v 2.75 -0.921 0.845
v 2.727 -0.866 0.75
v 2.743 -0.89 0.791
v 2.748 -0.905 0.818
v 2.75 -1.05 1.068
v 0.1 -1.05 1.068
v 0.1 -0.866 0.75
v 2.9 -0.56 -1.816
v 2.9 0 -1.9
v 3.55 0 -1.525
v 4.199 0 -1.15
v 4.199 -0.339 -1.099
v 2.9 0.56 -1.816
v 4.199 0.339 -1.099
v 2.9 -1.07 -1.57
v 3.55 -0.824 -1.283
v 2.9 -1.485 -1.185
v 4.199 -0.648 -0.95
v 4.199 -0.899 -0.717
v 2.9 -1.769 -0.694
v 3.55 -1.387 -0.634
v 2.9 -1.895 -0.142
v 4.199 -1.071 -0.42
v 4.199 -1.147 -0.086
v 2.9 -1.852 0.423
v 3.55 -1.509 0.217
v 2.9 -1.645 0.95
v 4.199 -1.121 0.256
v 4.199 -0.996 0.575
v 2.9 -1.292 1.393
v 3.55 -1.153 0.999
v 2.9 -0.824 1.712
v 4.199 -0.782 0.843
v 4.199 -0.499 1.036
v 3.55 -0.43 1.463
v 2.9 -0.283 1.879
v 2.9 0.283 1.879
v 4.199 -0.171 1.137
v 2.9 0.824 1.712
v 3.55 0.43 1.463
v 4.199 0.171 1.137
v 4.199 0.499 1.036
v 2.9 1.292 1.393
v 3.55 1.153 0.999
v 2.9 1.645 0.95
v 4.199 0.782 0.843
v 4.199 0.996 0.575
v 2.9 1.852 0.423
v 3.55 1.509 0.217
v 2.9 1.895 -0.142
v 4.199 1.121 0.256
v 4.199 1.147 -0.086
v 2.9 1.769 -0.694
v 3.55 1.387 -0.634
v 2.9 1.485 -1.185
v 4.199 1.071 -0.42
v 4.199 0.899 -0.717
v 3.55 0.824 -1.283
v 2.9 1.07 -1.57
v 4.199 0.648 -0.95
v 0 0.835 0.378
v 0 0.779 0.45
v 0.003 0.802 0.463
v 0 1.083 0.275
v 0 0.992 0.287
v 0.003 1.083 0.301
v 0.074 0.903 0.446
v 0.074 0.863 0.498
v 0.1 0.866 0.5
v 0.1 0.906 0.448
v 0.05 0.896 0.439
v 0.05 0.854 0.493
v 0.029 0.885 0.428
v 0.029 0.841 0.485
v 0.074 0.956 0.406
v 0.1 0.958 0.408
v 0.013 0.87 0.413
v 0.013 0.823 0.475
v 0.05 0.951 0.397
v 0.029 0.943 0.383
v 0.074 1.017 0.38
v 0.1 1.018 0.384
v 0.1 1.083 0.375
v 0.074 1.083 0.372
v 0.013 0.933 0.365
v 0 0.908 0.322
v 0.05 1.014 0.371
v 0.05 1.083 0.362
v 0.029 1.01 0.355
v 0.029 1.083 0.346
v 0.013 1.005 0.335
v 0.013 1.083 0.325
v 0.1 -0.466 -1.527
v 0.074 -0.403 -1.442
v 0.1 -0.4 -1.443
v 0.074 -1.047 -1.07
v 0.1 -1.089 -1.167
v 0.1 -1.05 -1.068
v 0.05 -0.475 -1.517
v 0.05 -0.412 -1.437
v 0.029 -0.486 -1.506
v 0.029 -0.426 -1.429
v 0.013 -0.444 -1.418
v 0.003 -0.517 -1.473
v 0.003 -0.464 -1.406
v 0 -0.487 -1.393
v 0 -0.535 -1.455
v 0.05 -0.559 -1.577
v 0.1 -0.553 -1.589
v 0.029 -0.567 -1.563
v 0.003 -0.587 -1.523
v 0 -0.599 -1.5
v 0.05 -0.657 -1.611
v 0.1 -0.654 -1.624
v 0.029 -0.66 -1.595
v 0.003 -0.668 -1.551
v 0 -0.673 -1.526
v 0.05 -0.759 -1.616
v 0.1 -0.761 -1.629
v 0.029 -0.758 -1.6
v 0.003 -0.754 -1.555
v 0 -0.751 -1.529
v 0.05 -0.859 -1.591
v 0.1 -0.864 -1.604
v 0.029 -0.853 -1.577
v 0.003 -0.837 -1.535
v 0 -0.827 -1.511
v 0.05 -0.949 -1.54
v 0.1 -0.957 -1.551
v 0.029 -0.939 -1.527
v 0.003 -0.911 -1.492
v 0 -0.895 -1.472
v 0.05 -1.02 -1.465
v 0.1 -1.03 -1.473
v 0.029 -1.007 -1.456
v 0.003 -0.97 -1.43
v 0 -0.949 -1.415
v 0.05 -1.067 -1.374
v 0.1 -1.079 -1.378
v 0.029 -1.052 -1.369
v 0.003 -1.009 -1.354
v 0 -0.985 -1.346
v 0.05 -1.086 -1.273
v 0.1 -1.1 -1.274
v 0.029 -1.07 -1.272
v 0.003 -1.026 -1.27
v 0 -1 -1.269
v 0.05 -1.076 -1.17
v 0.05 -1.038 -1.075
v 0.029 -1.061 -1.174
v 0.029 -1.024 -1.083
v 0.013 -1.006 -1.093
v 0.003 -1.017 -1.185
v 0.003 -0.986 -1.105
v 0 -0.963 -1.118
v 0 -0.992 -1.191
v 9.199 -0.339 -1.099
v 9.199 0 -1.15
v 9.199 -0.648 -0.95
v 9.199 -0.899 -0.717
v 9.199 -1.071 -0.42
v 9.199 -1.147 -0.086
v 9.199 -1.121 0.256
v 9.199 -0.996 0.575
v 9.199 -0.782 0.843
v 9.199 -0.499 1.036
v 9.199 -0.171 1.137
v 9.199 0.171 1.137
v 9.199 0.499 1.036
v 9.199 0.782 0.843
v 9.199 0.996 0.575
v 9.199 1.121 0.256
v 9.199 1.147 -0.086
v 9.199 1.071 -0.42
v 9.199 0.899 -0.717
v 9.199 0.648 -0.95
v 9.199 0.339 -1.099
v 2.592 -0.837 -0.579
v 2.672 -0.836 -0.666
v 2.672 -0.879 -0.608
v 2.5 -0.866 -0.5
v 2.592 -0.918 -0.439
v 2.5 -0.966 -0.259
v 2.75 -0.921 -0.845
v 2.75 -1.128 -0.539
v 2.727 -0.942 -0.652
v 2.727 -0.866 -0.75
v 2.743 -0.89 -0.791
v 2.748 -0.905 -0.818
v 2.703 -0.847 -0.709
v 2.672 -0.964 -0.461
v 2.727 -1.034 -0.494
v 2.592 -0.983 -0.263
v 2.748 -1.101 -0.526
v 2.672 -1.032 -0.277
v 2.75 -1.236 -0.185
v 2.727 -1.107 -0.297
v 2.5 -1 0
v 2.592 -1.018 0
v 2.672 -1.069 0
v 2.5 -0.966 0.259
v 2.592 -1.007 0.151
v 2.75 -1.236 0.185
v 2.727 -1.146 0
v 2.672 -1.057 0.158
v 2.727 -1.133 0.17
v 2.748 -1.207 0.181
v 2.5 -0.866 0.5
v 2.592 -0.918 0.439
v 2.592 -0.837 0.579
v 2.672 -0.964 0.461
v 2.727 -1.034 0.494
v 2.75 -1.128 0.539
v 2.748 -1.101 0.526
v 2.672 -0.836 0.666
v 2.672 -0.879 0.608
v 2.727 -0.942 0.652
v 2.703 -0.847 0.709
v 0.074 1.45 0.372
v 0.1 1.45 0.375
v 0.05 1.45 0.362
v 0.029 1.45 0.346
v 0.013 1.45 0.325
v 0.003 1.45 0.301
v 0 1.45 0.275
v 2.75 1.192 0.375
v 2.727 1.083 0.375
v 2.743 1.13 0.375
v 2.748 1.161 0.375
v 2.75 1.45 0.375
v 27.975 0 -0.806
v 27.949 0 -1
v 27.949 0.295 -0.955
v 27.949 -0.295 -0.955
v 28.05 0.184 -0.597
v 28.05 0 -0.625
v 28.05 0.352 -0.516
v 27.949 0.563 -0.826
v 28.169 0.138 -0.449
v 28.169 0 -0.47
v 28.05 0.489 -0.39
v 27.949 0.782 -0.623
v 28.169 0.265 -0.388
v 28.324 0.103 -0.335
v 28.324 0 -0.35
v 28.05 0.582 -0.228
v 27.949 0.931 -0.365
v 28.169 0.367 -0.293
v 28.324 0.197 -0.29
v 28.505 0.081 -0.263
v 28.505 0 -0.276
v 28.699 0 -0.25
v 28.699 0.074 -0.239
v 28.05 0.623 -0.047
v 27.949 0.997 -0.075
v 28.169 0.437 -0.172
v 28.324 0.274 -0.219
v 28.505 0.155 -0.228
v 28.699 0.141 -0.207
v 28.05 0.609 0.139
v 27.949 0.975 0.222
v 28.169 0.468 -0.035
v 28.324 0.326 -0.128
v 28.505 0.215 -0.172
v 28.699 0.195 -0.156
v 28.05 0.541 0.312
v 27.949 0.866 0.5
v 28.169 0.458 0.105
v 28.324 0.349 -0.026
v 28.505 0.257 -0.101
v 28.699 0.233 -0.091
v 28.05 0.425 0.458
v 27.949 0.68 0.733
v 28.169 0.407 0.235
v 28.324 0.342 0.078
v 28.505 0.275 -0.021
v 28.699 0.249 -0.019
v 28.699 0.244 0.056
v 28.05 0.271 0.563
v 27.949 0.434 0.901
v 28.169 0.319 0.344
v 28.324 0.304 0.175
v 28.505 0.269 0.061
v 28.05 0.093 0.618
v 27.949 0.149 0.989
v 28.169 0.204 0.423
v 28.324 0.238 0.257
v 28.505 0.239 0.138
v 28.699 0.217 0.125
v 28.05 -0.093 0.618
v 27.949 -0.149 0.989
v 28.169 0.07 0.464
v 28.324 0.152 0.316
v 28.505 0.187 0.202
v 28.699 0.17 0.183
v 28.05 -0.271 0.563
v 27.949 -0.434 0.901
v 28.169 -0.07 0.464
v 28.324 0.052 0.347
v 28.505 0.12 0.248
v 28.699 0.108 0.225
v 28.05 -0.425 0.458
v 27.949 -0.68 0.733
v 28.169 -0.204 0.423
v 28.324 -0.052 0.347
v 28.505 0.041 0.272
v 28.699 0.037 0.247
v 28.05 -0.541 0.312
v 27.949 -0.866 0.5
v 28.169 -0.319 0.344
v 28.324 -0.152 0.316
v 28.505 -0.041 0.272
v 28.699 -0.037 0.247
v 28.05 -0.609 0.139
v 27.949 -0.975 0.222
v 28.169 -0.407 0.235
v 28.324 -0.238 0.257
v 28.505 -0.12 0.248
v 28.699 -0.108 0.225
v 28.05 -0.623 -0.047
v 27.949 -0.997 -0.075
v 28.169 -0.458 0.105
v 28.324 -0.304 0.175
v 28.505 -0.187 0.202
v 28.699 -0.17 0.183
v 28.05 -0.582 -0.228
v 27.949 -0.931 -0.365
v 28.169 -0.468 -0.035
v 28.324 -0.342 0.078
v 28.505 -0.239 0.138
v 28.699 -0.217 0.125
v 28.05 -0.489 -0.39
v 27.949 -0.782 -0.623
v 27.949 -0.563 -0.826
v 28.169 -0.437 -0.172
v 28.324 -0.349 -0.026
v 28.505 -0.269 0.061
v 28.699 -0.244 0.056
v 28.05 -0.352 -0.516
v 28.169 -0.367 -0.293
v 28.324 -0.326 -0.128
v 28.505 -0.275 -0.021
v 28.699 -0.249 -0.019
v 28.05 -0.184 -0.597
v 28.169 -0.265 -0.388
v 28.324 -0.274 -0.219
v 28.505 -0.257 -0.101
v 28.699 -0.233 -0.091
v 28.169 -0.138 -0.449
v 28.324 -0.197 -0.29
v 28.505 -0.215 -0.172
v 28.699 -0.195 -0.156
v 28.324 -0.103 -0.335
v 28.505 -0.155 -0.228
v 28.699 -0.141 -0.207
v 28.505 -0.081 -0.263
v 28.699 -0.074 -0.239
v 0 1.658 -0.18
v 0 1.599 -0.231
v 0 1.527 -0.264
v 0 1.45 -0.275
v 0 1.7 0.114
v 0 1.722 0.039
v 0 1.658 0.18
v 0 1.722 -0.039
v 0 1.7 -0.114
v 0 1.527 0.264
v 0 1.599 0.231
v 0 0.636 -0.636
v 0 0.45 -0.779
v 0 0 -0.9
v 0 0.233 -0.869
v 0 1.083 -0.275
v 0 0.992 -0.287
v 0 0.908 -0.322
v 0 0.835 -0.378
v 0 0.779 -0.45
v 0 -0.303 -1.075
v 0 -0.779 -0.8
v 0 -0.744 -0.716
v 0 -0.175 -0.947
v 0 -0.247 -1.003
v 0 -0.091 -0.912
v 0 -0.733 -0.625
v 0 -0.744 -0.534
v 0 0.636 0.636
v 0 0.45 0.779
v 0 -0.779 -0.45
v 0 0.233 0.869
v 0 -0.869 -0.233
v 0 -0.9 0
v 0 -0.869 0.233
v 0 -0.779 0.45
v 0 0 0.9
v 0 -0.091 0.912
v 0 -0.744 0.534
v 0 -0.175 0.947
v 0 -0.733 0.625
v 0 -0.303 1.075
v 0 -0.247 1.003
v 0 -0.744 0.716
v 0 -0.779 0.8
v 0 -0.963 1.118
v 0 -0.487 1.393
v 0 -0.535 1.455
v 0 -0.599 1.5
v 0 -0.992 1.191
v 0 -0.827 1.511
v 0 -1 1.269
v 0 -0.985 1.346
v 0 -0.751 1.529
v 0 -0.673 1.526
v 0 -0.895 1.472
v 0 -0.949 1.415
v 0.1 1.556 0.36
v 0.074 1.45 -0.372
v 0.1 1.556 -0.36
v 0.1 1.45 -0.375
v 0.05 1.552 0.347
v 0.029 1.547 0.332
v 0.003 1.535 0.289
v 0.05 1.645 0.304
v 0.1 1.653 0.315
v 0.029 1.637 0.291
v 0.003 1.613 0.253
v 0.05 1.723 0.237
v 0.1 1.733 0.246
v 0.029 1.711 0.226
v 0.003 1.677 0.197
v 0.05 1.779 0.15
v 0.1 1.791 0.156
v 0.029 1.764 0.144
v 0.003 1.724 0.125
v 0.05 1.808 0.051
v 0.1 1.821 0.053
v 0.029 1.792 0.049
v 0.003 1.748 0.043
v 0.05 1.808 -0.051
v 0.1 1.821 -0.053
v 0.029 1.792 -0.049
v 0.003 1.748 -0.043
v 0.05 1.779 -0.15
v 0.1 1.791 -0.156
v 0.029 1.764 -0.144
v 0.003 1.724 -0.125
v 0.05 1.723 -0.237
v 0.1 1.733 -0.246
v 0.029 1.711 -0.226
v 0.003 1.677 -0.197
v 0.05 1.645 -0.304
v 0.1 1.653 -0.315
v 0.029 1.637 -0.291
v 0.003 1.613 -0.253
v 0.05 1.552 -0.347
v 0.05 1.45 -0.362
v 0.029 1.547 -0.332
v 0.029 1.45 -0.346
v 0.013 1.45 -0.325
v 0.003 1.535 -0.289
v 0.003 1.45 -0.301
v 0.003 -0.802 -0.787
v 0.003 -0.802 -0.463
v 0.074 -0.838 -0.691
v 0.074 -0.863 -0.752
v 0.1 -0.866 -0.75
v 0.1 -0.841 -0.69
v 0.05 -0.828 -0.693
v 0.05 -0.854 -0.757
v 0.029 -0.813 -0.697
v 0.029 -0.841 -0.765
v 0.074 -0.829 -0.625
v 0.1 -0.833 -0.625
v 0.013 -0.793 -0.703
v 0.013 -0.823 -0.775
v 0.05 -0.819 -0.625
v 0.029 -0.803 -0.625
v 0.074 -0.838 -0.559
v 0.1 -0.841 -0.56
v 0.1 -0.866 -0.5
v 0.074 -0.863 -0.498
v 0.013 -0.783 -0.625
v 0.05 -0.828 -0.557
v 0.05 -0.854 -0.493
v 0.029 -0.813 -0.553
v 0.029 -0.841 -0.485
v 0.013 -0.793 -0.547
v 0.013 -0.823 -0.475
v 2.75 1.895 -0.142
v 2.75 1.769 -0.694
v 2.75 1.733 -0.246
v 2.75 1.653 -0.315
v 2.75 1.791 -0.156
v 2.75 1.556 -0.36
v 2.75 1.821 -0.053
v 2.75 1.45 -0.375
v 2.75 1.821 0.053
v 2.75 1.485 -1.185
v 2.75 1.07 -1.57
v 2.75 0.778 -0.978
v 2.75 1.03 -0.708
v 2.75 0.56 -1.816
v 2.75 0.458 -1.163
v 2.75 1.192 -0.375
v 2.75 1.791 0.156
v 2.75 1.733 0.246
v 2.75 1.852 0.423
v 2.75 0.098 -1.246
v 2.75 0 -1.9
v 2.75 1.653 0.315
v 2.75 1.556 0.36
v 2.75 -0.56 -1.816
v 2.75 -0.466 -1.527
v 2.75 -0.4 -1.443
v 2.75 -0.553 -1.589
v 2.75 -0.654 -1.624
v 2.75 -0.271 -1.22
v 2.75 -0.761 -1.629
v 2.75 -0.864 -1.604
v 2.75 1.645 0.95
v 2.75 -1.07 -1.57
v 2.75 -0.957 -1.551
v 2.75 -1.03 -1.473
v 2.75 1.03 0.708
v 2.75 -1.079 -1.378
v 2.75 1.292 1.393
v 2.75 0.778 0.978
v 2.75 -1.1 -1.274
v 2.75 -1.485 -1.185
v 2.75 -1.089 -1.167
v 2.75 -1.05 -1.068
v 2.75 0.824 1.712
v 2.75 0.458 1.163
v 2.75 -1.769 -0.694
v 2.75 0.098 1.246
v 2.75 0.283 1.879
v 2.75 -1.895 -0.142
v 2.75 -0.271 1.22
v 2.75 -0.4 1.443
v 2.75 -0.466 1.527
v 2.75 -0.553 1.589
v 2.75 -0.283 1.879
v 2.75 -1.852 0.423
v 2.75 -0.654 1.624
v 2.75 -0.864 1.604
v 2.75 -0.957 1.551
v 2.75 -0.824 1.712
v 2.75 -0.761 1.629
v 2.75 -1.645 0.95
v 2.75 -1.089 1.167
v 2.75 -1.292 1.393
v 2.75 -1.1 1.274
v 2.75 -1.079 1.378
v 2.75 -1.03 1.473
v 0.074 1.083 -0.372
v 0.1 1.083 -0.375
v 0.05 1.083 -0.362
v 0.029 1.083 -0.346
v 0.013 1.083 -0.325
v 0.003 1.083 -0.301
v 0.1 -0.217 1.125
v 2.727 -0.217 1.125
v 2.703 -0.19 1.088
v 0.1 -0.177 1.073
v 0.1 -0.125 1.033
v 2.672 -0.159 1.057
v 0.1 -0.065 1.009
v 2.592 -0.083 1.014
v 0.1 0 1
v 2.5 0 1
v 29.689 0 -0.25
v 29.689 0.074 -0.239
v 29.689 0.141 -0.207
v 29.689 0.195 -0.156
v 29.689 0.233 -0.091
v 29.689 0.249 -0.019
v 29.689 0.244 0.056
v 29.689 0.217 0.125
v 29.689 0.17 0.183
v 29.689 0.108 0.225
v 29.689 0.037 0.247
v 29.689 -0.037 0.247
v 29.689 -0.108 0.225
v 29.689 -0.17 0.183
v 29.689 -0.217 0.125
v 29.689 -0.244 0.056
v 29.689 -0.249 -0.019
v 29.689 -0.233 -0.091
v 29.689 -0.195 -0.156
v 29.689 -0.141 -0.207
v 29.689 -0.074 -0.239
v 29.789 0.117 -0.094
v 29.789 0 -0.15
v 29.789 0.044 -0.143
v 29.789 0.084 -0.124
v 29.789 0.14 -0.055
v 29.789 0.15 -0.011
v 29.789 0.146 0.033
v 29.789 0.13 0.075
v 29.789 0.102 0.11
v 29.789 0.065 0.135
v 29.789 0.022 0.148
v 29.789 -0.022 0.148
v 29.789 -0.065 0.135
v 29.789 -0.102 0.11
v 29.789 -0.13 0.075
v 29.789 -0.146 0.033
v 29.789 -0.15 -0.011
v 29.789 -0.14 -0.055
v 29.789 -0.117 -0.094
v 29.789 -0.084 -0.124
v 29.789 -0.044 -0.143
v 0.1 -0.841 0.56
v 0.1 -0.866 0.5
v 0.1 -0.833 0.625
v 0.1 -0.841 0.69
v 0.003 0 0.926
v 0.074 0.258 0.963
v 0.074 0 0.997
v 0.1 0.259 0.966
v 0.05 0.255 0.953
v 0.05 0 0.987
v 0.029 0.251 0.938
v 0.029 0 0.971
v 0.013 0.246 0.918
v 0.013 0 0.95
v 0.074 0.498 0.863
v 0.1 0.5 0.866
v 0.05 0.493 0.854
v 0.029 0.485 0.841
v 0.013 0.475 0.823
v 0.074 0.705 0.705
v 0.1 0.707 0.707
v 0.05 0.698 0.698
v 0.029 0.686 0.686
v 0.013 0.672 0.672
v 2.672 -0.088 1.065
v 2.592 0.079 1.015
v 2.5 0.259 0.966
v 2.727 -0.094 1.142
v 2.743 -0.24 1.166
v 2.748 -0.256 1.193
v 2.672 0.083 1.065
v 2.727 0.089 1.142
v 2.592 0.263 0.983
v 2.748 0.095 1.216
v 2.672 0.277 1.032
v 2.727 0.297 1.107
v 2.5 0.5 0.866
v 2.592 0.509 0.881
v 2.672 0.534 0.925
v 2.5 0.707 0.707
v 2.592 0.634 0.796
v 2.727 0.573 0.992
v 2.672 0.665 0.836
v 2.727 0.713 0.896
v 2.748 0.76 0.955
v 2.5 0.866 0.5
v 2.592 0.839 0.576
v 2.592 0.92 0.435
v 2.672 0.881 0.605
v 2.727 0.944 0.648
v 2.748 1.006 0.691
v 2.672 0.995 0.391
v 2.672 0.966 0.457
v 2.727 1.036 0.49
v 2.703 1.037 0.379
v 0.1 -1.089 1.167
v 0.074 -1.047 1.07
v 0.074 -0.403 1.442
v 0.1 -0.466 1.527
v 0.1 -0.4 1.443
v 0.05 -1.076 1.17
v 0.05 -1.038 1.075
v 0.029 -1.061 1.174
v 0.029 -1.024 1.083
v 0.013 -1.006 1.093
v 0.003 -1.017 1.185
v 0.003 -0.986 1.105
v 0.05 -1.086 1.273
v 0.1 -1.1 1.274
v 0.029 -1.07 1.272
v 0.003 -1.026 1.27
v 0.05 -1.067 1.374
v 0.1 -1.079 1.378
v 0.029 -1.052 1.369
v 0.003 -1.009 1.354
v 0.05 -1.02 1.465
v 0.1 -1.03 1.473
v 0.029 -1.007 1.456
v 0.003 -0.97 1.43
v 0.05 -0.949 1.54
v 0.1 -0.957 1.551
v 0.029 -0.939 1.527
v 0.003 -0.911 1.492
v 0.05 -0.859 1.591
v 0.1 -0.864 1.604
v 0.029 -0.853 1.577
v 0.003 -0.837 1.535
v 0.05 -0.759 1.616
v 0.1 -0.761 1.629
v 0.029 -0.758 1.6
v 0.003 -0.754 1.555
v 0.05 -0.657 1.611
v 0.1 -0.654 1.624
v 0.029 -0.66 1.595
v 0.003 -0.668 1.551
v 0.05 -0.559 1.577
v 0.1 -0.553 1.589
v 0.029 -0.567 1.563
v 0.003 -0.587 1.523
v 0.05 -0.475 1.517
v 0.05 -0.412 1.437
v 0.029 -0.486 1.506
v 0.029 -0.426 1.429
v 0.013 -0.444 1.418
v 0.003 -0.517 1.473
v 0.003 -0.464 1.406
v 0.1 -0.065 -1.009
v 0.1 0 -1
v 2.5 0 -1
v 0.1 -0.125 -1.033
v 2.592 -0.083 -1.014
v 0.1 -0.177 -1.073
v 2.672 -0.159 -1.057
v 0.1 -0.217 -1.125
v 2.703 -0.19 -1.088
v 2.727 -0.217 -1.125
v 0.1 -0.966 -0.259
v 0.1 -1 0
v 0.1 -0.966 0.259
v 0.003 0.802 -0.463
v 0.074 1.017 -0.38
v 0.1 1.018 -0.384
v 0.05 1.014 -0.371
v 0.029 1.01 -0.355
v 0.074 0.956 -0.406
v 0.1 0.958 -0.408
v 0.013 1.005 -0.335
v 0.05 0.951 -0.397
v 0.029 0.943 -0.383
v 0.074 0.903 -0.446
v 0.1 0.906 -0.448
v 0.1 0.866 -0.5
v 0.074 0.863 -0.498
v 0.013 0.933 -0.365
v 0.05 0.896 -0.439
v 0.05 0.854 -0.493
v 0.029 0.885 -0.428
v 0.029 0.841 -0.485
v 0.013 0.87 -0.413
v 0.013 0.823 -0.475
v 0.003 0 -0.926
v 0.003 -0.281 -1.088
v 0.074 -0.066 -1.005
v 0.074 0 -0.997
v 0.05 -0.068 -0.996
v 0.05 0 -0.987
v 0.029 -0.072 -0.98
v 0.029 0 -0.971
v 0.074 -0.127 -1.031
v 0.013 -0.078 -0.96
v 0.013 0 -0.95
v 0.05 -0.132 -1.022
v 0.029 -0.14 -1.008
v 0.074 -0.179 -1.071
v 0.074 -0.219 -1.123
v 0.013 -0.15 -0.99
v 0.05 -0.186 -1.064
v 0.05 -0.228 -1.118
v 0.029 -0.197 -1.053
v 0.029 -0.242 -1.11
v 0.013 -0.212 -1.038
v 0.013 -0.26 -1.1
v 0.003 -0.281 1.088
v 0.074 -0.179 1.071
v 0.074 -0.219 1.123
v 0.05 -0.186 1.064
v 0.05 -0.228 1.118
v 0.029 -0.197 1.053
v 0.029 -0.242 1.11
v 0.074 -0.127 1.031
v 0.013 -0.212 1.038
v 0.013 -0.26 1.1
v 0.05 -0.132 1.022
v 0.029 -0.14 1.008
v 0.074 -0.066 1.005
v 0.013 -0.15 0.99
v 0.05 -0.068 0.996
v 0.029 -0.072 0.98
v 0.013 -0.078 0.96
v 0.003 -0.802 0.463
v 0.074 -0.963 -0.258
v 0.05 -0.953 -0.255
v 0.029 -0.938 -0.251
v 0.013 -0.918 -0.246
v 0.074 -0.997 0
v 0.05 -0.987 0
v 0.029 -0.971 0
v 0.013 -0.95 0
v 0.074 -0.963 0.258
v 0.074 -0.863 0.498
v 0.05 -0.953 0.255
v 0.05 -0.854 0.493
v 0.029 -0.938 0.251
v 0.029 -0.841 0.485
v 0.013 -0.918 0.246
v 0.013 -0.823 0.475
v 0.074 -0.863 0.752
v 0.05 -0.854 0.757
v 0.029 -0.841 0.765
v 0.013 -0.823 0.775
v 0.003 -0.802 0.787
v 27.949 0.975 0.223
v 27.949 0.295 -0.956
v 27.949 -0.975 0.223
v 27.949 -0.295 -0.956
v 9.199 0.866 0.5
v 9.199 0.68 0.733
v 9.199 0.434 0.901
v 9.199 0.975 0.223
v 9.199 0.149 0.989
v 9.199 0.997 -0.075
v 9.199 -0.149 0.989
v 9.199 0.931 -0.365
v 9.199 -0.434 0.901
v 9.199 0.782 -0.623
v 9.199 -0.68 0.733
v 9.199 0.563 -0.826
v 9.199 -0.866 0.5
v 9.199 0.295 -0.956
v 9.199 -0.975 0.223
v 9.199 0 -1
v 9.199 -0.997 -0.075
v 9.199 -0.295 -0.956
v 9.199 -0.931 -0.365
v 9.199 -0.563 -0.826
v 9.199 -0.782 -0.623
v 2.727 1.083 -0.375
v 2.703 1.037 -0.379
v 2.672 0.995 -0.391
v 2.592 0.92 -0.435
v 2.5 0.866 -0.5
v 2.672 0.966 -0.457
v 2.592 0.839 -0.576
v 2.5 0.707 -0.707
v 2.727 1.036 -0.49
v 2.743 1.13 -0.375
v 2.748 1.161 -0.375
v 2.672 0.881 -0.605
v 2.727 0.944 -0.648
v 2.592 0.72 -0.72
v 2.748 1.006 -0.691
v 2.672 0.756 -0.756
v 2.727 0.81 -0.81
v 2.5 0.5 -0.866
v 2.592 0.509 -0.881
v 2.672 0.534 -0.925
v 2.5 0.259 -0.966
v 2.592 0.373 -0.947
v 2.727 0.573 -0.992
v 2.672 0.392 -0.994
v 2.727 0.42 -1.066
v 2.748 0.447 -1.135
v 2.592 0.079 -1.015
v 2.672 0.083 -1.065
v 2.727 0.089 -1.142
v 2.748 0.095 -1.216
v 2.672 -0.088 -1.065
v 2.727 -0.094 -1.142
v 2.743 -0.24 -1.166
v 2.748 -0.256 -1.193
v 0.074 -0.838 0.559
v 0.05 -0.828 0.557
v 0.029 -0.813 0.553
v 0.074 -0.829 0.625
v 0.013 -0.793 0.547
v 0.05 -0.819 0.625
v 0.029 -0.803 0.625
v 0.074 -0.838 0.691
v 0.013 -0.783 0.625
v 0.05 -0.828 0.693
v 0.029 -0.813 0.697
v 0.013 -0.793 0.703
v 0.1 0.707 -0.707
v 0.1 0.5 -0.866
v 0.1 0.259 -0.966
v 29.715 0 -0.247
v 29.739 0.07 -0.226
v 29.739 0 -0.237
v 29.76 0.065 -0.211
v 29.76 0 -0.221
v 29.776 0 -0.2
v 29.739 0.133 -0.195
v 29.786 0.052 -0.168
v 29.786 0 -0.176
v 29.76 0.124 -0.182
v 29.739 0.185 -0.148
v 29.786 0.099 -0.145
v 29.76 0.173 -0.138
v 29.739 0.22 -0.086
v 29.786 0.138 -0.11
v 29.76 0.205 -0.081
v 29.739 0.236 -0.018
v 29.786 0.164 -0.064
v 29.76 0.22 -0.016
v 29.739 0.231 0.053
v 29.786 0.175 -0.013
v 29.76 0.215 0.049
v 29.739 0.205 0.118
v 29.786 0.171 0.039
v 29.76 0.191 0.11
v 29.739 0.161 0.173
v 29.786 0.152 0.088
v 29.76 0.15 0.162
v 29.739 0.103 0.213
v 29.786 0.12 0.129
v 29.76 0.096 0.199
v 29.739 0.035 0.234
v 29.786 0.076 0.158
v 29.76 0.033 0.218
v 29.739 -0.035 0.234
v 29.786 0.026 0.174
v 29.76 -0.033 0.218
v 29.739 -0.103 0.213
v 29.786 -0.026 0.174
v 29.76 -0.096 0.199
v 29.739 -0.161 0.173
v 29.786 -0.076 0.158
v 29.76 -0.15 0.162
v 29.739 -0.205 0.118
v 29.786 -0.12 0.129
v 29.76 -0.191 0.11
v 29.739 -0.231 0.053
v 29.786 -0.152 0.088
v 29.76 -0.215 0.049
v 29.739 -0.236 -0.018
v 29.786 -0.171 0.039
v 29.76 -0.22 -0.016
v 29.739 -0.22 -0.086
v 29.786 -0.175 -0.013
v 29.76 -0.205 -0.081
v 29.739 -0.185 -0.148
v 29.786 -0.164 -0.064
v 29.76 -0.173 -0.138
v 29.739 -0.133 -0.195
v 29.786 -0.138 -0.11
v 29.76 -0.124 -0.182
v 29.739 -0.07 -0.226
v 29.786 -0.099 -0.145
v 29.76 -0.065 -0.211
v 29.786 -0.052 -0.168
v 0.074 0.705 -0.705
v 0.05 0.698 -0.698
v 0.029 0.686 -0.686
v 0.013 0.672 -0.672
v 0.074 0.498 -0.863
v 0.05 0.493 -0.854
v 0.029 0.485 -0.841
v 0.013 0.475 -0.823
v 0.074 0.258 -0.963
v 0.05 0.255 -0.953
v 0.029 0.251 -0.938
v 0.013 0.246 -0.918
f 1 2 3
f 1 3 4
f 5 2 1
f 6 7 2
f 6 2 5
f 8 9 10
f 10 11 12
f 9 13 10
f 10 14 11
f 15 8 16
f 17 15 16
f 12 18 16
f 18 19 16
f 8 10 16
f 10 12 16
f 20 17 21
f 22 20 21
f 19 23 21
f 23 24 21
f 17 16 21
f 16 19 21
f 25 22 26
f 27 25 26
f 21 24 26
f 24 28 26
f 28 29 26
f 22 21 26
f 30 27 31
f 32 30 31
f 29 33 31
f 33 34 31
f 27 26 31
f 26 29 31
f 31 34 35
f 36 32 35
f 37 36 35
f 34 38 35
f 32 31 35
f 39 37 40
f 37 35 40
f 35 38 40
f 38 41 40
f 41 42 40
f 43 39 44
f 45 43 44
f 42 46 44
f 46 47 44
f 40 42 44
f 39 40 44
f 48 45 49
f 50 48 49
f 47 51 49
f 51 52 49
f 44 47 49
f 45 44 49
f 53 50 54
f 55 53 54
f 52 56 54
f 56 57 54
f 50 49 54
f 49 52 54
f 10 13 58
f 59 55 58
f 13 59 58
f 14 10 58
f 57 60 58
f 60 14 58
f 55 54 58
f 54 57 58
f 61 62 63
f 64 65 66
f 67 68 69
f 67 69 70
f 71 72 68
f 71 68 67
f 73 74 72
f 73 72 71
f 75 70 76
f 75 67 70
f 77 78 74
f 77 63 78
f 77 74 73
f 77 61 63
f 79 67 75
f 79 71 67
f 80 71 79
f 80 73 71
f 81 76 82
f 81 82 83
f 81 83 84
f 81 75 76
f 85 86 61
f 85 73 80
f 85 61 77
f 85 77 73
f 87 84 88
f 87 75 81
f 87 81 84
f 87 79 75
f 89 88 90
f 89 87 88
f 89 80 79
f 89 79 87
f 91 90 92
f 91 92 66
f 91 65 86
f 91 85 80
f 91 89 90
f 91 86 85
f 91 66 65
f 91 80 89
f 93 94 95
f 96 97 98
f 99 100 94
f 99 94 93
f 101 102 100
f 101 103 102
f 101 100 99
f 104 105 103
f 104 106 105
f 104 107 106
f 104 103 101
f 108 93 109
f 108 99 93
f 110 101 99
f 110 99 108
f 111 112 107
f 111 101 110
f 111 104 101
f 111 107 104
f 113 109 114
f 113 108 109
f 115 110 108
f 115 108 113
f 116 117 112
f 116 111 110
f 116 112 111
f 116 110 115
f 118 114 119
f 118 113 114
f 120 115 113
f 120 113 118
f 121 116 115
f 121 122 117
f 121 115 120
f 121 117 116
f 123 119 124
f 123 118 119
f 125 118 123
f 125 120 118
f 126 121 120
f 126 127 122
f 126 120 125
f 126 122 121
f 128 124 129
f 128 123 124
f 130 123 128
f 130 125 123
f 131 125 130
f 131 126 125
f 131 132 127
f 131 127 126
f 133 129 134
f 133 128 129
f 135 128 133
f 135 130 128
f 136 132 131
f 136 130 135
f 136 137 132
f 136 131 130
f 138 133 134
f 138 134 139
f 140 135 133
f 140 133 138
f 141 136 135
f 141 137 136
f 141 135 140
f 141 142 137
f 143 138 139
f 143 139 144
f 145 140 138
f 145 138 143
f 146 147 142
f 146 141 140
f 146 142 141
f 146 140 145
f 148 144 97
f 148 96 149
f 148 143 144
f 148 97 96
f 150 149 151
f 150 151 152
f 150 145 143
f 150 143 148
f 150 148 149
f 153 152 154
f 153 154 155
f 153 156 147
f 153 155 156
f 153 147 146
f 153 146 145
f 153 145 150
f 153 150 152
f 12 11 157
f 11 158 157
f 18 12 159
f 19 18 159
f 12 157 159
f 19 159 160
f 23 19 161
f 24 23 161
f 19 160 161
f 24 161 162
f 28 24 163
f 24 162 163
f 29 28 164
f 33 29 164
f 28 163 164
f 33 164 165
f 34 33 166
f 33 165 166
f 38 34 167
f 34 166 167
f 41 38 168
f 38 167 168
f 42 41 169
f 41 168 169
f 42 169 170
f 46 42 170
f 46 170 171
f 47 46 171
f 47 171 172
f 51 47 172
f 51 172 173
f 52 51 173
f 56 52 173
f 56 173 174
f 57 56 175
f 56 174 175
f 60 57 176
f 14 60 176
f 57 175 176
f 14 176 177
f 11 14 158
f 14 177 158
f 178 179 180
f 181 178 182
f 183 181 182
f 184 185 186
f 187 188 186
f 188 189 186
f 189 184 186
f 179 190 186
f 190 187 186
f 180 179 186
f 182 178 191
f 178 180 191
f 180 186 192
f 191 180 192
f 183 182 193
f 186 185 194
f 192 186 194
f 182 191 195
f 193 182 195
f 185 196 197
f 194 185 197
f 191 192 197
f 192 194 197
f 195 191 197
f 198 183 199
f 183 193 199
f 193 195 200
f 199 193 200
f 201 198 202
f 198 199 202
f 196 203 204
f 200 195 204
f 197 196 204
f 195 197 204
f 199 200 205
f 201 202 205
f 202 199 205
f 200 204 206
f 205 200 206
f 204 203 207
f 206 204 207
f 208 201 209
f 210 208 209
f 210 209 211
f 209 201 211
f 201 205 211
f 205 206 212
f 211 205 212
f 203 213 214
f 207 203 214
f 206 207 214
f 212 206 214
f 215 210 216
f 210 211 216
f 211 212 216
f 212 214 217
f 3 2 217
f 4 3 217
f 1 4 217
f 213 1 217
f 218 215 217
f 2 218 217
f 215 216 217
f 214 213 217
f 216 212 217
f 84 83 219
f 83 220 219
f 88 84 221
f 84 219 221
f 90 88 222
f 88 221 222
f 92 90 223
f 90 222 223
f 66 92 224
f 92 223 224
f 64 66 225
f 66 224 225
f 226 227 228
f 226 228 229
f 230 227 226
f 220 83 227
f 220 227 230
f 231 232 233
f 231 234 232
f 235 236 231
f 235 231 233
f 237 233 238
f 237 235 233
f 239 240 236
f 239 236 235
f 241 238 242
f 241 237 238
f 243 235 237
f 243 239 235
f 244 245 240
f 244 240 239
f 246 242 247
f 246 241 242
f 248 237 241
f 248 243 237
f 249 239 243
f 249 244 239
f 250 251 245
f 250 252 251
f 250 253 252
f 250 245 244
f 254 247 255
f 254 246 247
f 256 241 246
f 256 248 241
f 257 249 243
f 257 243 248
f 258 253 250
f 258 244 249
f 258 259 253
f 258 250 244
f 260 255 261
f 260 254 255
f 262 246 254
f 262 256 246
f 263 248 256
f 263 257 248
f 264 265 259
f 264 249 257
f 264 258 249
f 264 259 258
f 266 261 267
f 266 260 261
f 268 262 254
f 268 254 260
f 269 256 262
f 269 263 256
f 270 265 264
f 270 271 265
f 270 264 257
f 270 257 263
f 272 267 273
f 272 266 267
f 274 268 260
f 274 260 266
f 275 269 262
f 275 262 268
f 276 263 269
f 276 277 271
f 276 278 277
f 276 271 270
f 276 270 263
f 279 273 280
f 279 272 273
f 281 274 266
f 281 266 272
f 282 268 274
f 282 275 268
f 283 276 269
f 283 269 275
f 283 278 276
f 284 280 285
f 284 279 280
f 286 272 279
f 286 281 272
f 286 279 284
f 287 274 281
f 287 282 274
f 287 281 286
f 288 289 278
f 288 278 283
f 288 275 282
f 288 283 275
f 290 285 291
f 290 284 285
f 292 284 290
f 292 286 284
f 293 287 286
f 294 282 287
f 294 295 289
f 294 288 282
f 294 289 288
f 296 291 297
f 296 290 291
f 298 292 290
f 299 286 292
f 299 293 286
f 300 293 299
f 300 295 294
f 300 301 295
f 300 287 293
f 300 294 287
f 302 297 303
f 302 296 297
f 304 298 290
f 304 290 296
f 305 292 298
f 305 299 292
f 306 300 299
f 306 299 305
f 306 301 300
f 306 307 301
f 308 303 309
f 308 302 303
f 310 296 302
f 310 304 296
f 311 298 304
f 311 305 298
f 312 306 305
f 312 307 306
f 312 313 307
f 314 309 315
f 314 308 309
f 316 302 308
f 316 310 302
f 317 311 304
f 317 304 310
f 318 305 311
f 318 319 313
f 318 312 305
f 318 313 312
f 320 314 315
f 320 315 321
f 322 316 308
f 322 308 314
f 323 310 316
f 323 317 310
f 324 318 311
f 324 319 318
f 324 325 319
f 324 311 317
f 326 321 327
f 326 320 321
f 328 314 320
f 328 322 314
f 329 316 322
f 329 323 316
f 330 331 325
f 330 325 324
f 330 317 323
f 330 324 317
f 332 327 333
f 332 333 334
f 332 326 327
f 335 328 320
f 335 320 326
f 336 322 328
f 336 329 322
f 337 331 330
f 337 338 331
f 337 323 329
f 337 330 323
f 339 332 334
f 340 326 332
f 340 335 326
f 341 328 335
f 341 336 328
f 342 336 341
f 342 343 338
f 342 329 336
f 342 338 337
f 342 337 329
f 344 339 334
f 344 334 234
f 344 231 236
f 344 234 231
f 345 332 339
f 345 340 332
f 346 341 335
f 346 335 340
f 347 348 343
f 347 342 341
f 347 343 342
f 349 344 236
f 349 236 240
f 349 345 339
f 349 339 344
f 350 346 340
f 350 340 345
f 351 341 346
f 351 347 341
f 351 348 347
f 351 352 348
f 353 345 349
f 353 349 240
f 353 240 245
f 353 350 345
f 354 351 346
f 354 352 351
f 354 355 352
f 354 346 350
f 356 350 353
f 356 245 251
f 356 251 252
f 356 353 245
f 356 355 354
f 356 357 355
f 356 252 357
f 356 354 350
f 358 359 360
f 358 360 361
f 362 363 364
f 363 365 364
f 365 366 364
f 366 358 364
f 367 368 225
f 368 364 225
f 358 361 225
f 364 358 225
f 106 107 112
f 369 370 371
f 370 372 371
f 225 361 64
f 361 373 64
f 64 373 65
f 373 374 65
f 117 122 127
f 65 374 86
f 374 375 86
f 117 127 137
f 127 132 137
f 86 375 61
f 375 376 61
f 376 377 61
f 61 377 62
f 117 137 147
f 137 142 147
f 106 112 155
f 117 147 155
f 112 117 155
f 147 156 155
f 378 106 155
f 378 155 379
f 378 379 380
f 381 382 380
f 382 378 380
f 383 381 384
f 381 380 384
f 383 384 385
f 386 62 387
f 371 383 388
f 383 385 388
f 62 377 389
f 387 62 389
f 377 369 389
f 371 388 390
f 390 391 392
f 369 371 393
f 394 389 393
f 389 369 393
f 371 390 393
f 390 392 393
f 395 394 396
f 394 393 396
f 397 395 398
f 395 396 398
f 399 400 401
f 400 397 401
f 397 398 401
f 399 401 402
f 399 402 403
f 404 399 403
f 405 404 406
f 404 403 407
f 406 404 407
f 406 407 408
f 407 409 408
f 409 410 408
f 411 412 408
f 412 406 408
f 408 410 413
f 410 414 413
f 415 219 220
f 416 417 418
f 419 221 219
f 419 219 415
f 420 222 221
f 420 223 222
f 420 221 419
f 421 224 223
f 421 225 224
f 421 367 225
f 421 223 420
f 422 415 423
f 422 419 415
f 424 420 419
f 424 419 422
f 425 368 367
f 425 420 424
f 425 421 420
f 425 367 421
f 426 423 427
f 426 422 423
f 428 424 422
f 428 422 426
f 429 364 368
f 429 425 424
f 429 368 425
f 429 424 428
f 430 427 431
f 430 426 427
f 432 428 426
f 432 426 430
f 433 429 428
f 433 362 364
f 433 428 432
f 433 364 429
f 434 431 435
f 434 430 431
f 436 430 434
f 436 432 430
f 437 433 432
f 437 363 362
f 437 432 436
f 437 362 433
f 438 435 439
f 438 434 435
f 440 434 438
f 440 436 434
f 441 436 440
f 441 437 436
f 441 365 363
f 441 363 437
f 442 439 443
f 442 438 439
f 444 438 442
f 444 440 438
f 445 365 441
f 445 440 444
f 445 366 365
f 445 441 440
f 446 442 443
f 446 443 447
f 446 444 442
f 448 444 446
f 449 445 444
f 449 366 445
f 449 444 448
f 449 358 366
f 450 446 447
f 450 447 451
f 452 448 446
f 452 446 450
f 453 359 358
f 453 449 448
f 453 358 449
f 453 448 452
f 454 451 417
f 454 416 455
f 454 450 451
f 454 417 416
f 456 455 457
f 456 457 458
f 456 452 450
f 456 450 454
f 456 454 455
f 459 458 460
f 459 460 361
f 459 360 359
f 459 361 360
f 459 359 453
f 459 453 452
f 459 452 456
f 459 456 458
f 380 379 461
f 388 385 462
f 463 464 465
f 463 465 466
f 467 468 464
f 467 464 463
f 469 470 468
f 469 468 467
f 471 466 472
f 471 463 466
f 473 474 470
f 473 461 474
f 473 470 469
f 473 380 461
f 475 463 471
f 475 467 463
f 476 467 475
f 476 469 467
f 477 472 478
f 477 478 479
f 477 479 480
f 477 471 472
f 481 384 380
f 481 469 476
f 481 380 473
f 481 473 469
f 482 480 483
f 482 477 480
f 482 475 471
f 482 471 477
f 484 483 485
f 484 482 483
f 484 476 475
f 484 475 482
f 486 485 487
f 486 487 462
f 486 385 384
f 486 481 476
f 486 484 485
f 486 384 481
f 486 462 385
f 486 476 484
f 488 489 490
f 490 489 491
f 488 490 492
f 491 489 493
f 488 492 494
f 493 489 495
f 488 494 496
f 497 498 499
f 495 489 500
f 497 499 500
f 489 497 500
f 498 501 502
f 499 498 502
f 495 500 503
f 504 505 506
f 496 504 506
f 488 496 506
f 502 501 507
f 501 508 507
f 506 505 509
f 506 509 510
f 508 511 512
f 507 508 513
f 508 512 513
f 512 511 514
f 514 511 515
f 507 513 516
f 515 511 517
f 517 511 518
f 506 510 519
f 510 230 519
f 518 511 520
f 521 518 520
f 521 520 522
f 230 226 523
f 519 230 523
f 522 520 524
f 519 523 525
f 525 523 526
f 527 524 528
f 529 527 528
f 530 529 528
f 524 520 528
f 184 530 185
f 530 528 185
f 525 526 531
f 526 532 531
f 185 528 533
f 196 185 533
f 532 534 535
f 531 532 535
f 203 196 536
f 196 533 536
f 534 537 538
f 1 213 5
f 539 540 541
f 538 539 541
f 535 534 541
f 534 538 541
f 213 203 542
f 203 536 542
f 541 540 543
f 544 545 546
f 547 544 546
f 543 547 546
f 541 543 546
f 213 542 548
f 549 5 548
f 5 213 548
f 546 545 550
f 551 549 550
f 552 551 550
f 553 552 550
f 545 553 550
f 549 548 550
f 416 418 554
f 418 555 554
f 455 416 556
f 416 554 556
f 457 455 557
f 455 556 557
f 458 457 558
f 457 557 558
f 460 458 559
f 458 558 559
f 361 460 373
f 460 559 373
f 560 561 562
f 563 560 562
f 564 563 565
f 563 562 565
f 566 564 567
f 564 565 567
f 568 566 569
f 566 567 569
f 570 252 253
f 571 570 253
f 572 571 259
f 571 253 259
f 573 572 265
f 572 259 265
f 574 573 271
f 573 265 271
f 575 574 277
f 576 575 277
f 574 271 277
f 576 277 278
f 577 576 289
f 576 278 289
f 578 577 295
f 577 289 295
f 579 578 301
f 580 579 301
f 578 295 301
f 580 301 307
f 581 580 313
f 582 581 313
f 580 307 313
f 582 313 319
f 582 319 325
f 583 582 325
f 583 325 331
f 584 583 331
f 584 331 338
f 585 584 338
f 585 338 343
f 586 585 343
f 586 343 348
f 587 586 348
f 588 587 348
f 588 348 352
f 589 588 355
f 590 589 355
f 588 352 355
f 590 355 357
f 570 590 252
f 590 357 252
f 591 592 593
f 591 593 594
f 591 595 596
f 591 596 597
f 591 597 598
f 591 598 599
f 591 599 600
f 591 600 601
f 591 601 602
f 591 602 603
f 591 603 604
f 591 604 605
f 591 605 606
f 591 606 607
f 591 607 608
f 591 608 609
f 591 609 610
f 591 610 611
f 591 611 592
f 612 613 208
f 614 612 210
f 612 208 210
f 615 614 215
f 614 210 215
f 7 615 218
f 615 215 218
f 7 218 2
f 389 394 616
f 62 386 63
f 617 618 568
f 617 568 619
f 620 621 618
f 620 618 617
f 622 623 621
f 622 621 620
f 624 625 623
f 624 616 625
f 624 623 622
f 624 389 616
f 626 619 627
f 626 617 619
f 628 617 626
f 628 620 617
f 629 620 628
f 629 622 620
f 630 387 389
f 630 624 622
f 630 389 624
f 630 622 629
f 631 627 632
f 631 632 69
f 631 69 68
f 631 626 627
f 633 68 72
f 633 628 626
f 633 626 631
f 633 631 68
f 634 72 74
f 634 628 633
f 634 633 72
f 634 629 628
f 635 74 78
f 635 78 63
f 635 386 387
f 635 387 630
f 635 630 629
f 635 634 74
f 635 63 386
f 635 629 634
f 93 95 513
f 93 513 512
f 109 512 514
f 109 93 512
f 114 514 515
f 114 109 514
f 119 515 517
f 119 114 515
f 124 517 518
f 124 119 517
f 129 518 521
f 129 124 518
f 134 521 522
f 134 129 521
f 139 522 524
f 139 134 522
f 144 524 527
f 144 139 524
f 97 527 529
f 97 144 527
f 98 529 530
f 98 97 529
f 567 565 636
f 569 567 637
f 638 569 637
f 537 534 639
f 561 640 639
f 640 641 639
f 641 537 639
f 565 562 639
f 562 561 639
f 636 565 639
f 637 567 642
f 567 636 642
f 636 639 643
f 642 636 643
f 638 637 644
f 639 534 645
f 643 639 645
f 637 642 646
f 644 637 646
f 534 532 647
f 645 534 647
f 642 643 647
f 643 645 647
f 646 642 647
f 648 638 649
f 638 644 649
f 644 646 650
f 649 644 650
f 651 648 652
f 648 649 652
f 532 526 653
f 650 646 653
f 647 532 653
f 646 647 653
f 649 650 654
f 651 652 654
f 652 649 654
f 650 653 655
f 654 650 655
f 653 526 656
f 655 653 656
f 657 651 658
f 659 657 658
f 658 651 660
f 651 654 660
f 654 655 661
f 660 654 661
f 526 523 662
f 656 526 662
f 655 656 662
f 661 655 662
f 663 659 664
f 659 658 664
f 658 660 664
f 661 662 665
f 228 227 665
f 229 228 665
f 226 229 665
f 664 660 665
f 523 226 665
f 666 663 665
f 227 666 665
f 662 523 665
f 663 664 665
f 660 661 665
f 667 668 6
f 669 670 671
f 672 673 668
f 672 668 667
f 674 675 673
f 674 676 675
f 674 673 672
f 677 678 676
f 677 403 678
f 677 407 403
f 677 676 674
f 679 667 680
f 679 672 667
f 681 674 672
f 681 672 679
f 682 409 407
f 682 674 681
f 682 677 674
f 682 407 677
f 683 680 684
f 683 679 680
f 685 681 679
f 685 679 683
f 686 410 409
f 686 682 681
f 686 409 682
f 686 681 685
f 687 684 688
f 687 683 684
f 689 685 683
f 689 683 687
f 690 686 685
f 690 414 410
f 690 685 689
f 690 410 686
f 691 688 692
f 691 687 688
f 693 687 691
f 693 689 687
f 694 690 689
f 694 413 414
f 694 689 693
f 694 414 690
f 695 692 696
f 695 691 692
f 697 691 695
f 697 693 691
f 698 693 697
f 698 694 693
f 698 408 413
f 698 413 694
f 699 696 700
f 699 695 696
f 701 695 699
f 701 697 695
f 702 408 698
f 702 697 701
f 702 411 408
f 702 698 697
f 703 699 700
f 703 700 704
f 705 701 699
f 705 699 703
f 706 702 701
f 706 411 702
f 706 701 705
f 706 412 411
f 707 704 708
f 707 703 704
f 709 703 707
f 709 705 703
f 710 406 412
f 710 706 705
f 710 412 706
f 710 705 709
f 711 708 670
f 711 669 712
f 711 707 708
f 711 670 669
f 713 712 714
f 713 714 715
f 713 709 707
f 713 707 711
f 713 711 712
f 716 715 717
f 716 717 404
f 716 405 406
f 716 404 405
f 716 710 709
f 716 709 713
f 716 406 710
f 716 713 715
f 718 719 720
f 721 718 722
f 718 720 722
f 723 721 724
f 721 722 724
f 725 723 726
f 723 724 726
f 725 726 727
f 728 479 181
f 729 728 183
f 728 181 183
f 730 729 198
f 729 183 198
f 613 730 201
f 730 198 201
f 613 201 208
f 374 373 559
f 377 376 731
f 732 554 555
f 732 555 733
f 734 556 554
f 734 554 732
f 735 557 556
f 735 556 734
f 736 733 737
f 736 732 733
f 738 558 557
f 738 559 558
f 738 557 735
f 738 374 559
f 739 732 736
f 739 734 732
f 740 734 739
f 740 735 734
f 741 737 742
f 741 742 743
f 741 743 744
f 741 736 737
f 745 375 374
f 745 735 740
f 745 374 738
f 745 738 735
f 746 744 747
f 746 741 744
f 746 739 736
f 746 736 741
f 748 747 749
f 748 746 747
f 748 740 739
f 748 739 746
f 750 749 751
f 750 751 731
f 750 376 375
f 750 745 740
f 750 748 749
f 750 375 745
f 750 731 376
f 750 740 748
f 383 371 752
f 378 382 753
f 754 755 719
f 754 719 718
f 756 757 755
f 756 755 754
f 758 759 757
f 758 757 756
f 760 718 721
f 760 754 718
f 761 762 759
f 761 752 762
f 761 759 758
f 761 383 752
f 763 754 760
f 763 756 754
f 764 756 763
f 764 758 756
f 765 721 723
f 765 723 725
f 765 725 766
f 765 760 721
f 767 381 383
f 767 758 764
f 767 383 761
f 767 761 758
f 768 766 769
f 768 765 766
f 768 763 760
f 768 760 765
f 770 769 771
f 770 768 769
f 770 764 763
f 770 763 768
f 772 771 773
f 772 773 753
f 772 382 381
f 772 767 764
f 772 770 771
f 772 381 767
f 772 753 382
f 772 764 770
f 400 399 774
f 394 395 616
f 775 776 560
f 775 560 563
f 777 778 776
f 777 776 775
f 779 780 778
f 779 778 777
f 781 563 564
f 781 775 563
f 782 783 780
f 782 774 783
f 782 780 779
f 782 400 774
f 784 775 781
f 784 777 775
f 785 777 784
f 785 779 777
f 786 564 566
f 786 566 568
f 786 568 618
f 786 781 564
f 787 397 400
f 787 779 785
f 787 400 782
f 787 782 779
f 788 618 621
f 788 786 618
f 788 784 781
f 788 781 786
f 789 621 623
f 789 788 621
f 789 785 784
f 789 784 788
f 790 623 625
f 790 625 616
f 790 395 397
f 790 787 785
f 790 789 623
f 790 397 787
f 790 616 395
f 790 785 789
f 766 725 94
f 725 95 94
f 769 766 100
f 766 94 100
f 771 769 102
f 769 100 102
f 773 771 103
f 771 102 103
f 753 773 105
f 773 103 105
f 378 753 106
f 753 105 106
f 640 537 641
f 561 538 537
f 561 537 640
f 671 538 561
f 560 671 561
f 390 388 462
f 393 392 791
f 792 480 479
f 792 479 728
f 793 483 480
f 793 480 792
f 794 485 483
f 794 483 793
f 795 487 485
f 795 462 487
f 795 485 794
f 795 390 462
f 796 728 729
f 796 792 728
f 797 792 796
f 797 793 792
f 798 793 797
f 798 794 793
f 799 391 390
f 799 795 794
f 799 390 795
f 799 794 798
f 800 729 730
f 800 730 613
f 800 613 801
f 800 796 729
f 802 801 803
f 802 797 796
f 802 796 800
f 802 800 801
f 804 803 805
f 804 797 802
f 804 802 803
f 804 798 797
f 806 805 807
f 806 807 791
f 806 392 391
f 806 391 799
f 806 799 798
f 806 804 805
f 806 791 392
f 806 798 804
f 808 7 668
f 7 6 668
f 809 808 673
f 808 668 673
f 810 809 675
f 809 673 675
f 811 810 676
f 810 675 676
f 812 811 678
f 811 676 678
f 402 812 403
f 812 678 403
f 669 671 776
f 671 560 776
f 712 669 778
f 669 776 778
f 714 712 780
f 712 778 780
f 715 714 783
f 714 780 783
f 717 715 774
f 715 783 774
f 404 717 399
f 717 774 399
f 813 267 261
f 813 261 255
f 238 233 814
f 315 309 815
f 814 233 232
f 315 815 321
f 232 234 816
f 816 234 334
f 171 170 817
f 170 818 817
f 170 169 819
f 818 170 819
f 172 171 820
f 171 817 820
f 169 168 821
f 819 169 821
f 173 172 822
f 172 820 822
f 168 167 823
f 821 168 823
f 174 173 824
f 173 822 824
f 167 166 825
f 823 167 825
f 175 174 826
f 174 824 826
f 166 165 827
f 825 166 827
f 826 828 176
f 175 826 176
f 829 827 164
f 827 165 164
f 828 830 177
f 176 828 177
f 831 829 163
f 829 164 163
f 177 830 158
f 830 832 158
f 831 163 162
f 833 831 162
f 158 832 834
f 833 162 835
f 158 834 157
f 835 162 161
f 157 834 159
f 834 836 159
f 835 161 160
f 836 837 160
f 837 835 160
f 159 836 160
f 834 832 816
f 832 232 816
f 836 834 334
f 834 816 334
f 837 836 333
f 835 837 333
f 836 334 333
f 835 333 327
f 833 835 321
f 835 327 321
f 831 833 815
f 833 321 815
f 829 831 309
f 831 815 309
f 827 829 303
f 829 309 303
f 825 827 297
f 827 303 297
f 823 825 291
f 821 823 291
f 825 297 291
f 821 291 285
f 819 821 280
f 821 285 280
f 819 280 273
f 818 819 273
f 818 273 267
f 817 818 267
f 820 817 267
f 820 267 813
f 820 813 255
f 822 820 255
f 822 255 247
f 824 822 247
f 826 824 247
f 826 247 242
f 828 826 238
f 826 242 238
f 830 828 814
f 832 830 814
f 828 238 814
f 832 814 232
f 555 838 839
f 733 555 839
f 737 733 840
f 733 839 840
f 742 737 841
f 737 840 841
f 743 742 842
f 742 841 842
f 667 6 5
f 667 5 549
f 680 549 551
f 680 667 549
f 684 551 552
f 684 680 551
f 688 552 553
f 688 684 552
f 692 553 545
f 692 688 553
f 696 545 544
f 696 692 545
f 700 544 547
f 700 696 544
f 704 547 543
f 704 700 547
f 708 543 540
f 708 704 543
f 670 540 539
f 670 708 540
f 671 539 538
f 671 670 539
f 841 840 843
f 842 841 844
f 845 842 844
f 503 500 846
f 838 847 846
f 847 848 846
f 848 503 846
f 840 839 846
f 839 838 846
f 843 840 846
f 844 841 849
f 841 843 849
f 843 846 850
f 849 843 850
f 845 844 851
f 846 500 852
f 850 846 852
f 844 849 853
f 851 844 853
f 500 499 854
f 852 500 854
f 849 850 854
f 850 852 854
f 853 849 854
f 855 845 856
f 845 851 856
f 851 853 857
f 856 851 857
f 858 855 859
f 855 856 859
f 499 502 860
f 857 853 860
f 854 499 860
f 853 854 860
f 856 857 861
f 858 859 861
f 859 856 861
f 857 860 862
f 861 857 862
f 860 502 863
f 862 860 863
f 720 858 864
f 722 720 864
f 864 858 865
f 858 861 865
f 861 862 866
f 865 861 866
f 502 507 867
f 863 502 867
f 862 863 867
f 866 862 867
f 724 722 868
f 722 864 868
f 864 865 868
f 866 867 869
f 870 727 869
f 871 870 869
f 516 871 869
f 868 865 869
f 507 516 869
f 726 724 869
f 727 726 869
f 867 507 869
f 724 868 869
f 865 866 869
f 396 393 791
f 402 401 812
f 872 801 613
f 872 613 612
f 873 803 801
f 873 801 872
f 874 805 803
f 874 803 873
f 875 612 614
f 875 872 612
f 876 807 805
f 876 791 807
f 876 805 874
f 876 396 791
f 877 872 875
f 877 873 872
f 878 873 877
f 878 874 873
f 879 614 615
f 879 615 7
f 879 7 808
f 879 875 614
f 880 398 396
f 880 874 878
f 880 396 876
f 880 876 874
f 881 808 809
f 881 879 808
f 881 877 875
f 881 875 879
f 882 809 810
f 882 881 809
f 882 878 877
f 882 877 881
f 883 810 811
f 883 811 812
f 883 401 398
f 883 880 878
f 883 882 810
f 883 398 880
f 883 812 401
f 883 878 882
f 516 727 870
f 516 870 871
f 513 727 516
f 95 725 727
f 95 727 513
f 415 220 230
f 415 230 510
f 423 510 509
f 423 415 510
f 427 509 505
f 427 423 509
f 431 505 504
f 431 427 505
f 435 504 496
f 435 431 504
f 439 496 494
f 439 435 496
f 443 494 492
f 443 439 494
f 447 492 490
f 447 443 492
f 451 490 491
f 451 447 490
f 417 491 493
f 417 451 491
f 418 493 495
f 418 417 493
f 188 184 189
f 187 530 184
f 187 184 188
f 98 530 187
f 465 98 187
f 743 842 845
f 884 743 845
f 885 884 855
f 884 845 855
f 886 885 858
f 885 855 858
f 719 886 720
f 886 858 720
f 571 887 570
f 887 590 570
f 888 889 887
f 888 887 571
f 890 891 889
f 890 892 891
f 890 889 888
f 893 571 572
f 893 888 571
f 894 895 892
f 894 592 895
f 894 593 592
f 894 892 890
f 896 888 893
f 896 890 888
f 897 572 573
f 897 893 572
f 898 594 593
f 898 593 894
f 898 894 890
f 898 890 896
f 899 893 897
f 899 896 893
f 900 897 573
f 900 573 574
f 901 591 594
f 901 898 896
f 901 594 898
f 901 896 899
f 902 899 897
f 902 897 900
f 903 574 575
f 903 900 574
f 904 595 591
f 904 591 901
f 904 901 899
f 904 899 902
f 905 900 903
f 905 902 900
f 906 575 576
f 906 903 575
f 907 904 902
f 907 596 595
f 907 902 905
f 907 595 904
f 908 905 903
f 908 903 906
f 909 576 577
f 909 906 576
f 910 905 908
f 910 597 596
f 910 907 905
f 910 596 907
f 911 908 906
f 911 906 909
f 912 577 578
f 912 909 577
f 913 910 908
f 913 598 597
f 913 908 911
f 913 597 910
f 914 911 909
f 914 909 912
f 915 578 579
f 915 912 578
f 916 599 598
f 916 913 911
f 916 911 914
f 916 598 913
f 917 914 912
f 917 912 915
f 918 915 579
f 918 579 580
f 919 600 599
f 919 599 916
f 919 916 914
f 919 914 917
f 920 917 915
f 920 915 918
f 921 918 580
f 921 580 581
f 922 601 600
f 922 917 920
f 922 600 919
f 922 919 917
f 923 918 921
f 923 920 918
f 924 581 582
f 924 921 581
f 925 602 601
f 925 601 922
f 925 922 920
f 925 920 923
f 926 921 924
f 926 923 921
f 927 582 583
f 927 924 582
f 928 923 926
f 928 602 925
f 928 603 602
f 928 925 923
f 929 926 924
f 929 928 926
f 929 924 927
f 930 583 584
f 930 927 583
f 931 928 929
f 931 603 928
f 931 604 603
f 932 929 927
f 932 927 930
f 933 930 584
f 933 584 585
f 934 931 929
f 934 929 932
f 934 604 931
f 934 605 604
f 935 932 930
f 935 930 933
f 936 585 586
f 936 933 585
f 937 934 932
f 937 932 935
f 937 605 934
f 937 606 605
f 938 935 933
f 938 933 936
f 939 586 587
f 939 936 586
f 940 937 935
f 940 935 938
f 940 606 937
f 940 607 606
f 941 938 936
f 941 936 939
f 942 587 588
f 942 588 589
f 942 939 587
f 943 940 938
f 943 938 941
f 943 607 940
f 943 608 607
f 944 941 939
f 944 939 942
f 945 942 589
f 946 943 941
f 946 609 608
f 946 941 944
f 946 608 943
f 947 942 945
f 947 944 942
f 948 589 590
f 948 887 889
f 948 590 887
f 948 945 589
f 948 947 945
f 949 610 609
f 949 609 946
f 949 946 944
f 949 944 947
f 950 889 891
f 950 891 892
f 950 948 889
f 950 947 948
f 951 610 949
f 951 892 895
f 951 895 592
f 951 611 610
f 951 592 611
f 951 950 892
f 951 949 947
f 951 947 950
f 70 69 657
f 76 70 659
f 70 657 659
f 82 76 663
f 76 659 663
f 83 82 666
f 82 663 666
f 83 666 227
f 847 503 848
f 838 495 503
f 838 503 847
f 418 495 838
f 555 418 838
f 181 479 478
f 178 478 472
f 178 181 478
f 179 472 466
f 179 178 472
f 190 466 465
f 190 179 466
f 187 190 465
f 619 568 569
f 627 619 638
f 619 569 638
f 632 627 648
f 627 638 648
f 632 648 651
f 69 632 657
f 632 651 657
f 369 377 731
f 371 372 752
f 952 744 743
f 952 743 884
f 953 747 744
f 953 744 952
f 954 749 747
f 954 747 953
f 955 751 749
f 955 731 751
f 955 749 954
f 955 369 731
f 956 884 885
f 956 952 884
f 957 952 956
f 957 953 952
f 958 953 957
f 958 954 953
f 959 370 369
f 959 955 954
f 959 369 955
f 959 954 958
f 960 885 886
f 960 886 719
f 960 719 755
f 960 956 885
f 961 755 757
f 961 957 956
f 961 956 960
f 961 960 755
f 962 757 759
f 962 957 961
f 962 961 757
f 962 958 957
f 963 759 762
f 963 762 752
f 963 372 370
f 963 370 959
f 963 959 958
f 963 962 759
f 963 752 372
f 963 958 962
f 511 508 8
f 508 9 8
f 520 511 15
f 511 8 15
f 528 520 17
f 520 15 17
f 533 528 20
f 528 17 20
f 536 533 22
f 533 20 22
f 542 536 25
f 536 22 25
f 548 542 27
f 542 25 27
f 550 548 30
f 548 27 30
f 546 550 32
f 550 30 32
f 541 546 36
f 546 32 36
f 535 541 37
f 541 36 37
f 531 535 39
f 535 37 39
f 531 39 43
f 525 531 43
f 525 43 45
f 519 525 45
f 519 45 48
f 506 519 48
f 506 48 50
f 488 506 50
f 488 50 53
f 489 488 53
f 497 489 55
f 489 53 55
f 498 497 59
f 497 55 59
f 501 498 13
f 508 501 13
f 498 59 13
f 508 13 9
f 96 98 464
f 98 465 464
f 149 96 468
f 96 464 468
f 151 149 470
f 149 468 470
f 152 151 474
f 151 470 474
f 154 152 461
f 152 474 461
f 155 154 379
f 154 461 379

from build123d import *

# Parameters (mm, degrees)
BOSS_EXTRUDE1_DEPTH = 2.75
CIRPATTERN1_COUNT   = 3
FILLET1_R           = 0.25
SKETCH3_R           = 0.25
BOSS_EXTRUDE2_DEPTH = 1.84
FILLET2_R           = 0.75
FILLET3_R           = 0.1


with BuildPart() as part:
    # Sketch1 → Revolve1 (revolve)
    with BuildSketch(Plane.XY, mode=Mode.PRIVATE) as revolve1_sk:
        Polygon((0, 0), (0, 1), (2.75, 1), (2.75, 1.9), (2.9, 1.9), (4.199038106, 1.15), (9.199038106, 1.15), (9.199038106, 1), (27.949038106, 1), (27.949038106, 0), align=None)
    revolve(revolve1_sk.sketch.rotate(Axis((27.949038106, 0, 0), (-1, 0, 0)), 90), axis=Axis((27.949038106, 0, 0), (-1, 0, 0)))

    # Sketch2 → Boss-Extrude1 (add)
    with BuildSketch(Plane.ZY):
        with BuildLine():
            Line((-0.375, 0), (0.375, 0))
            Line((0.375, 0), (0.375, 1.45))
            ThreePointArc((0.375, 1.45), (0, 1.825), (-0.375, 1.45))
            Line((-0.375, 1.45), (-0.375, 0))
        make_face()
    boss_extrude1 = extrude(amount=-BOSS_EXTRUDE1_DEPTH)

    # CirPattern1: Boss-Extrude1 ×3 about axis
    cirpattern1_axis = Axis((0, 0, 0), (1, 0, 0))
    for i in range(1, CIRPATTERN1_COUNT):
        add(boss_extrude1.rotate(cirpattern1_axis, i * 360 / CIRPATTERN1_COUNT))

    # Fillet1
    fillet1_edges = [part.edges().sort_by_distance(p)[0] for p in [
        (2.75, 0.5, 0.866025404),
        (1.375, 0.927024811, -0.375),
        (1.375, 0.927024811, 0.375),
        (2.75, -1, 0),
        (2.75, 0.5, -0.866025404),
        (1.375, -0.138752879, 0.990327036),
        (1.375, -0.788271932, 0.615327036),
        (1.375, -0.788271932, -0.615327036),
        (1.375, -0.138752879, -0.990327036),
    ]]
    fillet(fillet1_edges, radius=FILLET1_R)

    # Sketch3 → Boss-Extrude2 (add)
    with BuildSketch(Plane(origin=(27.949038106, 0, 0), x_dir=(0, 0, -1), z_dir=(1, 0, 0))):
        Circle(SKETCH3_R)
    extrude(amount=BOSS_EXTRUDE2_DEPTH)

    # Fillet2
    fillet2_edges = [part.edges().sort_by_distance(p)[0] for p in [
        (27.949038106, 0, 0.25),
    ]]
    fillet(fillet2_edges, radius=FILLET2_R - 0.0001)  # a hair under: the kernel refuses the full size

    # Fillet3
    fillet3_edges = [part.edges().sort_by_distance(p)[0] for p in [
        (29.789038106, 0, 0.25),
        (0, 1.825, 0),
        (0, 1.266265877, -0.375),
        (0, -0.9125, -1.580496362),
        (0, -0.957892465, -0.909118418),
        (0, -0.9125, 1.580496362),
        (0, -0.308373412, 1.284118418),
        (0, 0.4999999999999994, -0.866025403784439),
        (0, -0.308373412, -1.284118418),
        (0, -0.957892465, 0.909118418),
        (0, -1, 0),
        (0, 0.5000000000000002, 0.8660254037844385),
        (0, 1.266265877, 0.375),
        (0, 0.957531755, -0.408493649),
        (0, -0.125, -1.033493649),
        (0, -0.832531755, 0.625),
        (0, -0.832531755, -0.625),
        (0, -0.125, 1.033493649),
        (0, 0.957531755, 0.408493649),
    ]]
    fillet(fillet3_edges, radius=FILLET3_R)


solid = part.part
